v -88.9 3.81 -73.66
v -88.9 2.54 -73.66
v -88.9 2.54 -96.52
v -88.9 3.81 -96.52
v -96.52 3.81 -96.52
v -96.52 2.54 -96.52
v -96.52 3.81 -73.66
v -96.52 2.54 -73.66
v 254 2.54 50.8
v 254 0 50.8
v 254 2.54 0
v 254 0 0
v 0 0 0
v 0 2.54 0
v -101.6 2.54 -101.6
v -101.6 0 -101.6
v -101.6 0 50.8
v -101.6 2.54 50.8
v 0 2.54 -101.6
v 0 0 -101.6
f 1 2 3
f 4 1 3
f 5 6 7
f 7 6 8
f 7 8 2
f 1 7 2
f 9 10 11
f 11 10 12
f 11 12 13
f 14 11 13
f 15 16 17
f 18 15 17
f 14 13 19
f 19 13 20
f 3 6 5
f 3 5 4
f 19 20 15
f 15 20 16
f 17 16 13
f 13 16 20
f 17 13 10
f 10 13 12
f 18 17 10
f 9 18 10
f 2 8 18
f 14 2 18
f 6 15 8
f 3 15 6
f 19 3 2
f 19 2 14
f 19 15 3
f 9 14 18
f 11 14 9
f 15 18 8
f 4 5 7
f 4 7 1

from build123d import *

# Parameters (mm, degrees)
BOSS_EXTRUDE1_DEPTH = 2.54
SKETCH2_W           = 7.62
SKETCH2_H           = 7.62
BOSS_EXTRUDE2_DEPTH = 1.27


with BuildPart() as part:
    # Sketch1 → Boss-Extrude1 (new body)
    with BuildSketch(Plane(origin=(0, 0, 0), x_dir=(1, 0, 0), z_dir=(0, 1, 0))):
        Polygon((0, 0), (0, 101.6), (-101.6, 101.6), (-101.6, -50.8), (254, -50.8), (254, 0), align=None)
    extrude(amount=BOSS_EXTRUDE1_DEPTH)

    # Sketch2 → Boss-Extrude2 (add)
    with BuildSketch(Plane(origin=(0, 2.54, 0), x_dir=(1, 0, 0), z_dir=(0, 1, 0))):
        with Locations((-92.71, 92.71)):
            Rectangle(SKETCH2_W, SKETCH2_H)
        with Locations((-92.71, 85.09)):
            Rectangle(SKETCH2_W, SKETCH2_H)
        with Locations((-92.71, 77.47)):
            Rectangle(SKETCH2_W, SKETCH2_H)
    extrude(amount=BOSS_EXTRUDE2_DEPTH)


solid = part.part
